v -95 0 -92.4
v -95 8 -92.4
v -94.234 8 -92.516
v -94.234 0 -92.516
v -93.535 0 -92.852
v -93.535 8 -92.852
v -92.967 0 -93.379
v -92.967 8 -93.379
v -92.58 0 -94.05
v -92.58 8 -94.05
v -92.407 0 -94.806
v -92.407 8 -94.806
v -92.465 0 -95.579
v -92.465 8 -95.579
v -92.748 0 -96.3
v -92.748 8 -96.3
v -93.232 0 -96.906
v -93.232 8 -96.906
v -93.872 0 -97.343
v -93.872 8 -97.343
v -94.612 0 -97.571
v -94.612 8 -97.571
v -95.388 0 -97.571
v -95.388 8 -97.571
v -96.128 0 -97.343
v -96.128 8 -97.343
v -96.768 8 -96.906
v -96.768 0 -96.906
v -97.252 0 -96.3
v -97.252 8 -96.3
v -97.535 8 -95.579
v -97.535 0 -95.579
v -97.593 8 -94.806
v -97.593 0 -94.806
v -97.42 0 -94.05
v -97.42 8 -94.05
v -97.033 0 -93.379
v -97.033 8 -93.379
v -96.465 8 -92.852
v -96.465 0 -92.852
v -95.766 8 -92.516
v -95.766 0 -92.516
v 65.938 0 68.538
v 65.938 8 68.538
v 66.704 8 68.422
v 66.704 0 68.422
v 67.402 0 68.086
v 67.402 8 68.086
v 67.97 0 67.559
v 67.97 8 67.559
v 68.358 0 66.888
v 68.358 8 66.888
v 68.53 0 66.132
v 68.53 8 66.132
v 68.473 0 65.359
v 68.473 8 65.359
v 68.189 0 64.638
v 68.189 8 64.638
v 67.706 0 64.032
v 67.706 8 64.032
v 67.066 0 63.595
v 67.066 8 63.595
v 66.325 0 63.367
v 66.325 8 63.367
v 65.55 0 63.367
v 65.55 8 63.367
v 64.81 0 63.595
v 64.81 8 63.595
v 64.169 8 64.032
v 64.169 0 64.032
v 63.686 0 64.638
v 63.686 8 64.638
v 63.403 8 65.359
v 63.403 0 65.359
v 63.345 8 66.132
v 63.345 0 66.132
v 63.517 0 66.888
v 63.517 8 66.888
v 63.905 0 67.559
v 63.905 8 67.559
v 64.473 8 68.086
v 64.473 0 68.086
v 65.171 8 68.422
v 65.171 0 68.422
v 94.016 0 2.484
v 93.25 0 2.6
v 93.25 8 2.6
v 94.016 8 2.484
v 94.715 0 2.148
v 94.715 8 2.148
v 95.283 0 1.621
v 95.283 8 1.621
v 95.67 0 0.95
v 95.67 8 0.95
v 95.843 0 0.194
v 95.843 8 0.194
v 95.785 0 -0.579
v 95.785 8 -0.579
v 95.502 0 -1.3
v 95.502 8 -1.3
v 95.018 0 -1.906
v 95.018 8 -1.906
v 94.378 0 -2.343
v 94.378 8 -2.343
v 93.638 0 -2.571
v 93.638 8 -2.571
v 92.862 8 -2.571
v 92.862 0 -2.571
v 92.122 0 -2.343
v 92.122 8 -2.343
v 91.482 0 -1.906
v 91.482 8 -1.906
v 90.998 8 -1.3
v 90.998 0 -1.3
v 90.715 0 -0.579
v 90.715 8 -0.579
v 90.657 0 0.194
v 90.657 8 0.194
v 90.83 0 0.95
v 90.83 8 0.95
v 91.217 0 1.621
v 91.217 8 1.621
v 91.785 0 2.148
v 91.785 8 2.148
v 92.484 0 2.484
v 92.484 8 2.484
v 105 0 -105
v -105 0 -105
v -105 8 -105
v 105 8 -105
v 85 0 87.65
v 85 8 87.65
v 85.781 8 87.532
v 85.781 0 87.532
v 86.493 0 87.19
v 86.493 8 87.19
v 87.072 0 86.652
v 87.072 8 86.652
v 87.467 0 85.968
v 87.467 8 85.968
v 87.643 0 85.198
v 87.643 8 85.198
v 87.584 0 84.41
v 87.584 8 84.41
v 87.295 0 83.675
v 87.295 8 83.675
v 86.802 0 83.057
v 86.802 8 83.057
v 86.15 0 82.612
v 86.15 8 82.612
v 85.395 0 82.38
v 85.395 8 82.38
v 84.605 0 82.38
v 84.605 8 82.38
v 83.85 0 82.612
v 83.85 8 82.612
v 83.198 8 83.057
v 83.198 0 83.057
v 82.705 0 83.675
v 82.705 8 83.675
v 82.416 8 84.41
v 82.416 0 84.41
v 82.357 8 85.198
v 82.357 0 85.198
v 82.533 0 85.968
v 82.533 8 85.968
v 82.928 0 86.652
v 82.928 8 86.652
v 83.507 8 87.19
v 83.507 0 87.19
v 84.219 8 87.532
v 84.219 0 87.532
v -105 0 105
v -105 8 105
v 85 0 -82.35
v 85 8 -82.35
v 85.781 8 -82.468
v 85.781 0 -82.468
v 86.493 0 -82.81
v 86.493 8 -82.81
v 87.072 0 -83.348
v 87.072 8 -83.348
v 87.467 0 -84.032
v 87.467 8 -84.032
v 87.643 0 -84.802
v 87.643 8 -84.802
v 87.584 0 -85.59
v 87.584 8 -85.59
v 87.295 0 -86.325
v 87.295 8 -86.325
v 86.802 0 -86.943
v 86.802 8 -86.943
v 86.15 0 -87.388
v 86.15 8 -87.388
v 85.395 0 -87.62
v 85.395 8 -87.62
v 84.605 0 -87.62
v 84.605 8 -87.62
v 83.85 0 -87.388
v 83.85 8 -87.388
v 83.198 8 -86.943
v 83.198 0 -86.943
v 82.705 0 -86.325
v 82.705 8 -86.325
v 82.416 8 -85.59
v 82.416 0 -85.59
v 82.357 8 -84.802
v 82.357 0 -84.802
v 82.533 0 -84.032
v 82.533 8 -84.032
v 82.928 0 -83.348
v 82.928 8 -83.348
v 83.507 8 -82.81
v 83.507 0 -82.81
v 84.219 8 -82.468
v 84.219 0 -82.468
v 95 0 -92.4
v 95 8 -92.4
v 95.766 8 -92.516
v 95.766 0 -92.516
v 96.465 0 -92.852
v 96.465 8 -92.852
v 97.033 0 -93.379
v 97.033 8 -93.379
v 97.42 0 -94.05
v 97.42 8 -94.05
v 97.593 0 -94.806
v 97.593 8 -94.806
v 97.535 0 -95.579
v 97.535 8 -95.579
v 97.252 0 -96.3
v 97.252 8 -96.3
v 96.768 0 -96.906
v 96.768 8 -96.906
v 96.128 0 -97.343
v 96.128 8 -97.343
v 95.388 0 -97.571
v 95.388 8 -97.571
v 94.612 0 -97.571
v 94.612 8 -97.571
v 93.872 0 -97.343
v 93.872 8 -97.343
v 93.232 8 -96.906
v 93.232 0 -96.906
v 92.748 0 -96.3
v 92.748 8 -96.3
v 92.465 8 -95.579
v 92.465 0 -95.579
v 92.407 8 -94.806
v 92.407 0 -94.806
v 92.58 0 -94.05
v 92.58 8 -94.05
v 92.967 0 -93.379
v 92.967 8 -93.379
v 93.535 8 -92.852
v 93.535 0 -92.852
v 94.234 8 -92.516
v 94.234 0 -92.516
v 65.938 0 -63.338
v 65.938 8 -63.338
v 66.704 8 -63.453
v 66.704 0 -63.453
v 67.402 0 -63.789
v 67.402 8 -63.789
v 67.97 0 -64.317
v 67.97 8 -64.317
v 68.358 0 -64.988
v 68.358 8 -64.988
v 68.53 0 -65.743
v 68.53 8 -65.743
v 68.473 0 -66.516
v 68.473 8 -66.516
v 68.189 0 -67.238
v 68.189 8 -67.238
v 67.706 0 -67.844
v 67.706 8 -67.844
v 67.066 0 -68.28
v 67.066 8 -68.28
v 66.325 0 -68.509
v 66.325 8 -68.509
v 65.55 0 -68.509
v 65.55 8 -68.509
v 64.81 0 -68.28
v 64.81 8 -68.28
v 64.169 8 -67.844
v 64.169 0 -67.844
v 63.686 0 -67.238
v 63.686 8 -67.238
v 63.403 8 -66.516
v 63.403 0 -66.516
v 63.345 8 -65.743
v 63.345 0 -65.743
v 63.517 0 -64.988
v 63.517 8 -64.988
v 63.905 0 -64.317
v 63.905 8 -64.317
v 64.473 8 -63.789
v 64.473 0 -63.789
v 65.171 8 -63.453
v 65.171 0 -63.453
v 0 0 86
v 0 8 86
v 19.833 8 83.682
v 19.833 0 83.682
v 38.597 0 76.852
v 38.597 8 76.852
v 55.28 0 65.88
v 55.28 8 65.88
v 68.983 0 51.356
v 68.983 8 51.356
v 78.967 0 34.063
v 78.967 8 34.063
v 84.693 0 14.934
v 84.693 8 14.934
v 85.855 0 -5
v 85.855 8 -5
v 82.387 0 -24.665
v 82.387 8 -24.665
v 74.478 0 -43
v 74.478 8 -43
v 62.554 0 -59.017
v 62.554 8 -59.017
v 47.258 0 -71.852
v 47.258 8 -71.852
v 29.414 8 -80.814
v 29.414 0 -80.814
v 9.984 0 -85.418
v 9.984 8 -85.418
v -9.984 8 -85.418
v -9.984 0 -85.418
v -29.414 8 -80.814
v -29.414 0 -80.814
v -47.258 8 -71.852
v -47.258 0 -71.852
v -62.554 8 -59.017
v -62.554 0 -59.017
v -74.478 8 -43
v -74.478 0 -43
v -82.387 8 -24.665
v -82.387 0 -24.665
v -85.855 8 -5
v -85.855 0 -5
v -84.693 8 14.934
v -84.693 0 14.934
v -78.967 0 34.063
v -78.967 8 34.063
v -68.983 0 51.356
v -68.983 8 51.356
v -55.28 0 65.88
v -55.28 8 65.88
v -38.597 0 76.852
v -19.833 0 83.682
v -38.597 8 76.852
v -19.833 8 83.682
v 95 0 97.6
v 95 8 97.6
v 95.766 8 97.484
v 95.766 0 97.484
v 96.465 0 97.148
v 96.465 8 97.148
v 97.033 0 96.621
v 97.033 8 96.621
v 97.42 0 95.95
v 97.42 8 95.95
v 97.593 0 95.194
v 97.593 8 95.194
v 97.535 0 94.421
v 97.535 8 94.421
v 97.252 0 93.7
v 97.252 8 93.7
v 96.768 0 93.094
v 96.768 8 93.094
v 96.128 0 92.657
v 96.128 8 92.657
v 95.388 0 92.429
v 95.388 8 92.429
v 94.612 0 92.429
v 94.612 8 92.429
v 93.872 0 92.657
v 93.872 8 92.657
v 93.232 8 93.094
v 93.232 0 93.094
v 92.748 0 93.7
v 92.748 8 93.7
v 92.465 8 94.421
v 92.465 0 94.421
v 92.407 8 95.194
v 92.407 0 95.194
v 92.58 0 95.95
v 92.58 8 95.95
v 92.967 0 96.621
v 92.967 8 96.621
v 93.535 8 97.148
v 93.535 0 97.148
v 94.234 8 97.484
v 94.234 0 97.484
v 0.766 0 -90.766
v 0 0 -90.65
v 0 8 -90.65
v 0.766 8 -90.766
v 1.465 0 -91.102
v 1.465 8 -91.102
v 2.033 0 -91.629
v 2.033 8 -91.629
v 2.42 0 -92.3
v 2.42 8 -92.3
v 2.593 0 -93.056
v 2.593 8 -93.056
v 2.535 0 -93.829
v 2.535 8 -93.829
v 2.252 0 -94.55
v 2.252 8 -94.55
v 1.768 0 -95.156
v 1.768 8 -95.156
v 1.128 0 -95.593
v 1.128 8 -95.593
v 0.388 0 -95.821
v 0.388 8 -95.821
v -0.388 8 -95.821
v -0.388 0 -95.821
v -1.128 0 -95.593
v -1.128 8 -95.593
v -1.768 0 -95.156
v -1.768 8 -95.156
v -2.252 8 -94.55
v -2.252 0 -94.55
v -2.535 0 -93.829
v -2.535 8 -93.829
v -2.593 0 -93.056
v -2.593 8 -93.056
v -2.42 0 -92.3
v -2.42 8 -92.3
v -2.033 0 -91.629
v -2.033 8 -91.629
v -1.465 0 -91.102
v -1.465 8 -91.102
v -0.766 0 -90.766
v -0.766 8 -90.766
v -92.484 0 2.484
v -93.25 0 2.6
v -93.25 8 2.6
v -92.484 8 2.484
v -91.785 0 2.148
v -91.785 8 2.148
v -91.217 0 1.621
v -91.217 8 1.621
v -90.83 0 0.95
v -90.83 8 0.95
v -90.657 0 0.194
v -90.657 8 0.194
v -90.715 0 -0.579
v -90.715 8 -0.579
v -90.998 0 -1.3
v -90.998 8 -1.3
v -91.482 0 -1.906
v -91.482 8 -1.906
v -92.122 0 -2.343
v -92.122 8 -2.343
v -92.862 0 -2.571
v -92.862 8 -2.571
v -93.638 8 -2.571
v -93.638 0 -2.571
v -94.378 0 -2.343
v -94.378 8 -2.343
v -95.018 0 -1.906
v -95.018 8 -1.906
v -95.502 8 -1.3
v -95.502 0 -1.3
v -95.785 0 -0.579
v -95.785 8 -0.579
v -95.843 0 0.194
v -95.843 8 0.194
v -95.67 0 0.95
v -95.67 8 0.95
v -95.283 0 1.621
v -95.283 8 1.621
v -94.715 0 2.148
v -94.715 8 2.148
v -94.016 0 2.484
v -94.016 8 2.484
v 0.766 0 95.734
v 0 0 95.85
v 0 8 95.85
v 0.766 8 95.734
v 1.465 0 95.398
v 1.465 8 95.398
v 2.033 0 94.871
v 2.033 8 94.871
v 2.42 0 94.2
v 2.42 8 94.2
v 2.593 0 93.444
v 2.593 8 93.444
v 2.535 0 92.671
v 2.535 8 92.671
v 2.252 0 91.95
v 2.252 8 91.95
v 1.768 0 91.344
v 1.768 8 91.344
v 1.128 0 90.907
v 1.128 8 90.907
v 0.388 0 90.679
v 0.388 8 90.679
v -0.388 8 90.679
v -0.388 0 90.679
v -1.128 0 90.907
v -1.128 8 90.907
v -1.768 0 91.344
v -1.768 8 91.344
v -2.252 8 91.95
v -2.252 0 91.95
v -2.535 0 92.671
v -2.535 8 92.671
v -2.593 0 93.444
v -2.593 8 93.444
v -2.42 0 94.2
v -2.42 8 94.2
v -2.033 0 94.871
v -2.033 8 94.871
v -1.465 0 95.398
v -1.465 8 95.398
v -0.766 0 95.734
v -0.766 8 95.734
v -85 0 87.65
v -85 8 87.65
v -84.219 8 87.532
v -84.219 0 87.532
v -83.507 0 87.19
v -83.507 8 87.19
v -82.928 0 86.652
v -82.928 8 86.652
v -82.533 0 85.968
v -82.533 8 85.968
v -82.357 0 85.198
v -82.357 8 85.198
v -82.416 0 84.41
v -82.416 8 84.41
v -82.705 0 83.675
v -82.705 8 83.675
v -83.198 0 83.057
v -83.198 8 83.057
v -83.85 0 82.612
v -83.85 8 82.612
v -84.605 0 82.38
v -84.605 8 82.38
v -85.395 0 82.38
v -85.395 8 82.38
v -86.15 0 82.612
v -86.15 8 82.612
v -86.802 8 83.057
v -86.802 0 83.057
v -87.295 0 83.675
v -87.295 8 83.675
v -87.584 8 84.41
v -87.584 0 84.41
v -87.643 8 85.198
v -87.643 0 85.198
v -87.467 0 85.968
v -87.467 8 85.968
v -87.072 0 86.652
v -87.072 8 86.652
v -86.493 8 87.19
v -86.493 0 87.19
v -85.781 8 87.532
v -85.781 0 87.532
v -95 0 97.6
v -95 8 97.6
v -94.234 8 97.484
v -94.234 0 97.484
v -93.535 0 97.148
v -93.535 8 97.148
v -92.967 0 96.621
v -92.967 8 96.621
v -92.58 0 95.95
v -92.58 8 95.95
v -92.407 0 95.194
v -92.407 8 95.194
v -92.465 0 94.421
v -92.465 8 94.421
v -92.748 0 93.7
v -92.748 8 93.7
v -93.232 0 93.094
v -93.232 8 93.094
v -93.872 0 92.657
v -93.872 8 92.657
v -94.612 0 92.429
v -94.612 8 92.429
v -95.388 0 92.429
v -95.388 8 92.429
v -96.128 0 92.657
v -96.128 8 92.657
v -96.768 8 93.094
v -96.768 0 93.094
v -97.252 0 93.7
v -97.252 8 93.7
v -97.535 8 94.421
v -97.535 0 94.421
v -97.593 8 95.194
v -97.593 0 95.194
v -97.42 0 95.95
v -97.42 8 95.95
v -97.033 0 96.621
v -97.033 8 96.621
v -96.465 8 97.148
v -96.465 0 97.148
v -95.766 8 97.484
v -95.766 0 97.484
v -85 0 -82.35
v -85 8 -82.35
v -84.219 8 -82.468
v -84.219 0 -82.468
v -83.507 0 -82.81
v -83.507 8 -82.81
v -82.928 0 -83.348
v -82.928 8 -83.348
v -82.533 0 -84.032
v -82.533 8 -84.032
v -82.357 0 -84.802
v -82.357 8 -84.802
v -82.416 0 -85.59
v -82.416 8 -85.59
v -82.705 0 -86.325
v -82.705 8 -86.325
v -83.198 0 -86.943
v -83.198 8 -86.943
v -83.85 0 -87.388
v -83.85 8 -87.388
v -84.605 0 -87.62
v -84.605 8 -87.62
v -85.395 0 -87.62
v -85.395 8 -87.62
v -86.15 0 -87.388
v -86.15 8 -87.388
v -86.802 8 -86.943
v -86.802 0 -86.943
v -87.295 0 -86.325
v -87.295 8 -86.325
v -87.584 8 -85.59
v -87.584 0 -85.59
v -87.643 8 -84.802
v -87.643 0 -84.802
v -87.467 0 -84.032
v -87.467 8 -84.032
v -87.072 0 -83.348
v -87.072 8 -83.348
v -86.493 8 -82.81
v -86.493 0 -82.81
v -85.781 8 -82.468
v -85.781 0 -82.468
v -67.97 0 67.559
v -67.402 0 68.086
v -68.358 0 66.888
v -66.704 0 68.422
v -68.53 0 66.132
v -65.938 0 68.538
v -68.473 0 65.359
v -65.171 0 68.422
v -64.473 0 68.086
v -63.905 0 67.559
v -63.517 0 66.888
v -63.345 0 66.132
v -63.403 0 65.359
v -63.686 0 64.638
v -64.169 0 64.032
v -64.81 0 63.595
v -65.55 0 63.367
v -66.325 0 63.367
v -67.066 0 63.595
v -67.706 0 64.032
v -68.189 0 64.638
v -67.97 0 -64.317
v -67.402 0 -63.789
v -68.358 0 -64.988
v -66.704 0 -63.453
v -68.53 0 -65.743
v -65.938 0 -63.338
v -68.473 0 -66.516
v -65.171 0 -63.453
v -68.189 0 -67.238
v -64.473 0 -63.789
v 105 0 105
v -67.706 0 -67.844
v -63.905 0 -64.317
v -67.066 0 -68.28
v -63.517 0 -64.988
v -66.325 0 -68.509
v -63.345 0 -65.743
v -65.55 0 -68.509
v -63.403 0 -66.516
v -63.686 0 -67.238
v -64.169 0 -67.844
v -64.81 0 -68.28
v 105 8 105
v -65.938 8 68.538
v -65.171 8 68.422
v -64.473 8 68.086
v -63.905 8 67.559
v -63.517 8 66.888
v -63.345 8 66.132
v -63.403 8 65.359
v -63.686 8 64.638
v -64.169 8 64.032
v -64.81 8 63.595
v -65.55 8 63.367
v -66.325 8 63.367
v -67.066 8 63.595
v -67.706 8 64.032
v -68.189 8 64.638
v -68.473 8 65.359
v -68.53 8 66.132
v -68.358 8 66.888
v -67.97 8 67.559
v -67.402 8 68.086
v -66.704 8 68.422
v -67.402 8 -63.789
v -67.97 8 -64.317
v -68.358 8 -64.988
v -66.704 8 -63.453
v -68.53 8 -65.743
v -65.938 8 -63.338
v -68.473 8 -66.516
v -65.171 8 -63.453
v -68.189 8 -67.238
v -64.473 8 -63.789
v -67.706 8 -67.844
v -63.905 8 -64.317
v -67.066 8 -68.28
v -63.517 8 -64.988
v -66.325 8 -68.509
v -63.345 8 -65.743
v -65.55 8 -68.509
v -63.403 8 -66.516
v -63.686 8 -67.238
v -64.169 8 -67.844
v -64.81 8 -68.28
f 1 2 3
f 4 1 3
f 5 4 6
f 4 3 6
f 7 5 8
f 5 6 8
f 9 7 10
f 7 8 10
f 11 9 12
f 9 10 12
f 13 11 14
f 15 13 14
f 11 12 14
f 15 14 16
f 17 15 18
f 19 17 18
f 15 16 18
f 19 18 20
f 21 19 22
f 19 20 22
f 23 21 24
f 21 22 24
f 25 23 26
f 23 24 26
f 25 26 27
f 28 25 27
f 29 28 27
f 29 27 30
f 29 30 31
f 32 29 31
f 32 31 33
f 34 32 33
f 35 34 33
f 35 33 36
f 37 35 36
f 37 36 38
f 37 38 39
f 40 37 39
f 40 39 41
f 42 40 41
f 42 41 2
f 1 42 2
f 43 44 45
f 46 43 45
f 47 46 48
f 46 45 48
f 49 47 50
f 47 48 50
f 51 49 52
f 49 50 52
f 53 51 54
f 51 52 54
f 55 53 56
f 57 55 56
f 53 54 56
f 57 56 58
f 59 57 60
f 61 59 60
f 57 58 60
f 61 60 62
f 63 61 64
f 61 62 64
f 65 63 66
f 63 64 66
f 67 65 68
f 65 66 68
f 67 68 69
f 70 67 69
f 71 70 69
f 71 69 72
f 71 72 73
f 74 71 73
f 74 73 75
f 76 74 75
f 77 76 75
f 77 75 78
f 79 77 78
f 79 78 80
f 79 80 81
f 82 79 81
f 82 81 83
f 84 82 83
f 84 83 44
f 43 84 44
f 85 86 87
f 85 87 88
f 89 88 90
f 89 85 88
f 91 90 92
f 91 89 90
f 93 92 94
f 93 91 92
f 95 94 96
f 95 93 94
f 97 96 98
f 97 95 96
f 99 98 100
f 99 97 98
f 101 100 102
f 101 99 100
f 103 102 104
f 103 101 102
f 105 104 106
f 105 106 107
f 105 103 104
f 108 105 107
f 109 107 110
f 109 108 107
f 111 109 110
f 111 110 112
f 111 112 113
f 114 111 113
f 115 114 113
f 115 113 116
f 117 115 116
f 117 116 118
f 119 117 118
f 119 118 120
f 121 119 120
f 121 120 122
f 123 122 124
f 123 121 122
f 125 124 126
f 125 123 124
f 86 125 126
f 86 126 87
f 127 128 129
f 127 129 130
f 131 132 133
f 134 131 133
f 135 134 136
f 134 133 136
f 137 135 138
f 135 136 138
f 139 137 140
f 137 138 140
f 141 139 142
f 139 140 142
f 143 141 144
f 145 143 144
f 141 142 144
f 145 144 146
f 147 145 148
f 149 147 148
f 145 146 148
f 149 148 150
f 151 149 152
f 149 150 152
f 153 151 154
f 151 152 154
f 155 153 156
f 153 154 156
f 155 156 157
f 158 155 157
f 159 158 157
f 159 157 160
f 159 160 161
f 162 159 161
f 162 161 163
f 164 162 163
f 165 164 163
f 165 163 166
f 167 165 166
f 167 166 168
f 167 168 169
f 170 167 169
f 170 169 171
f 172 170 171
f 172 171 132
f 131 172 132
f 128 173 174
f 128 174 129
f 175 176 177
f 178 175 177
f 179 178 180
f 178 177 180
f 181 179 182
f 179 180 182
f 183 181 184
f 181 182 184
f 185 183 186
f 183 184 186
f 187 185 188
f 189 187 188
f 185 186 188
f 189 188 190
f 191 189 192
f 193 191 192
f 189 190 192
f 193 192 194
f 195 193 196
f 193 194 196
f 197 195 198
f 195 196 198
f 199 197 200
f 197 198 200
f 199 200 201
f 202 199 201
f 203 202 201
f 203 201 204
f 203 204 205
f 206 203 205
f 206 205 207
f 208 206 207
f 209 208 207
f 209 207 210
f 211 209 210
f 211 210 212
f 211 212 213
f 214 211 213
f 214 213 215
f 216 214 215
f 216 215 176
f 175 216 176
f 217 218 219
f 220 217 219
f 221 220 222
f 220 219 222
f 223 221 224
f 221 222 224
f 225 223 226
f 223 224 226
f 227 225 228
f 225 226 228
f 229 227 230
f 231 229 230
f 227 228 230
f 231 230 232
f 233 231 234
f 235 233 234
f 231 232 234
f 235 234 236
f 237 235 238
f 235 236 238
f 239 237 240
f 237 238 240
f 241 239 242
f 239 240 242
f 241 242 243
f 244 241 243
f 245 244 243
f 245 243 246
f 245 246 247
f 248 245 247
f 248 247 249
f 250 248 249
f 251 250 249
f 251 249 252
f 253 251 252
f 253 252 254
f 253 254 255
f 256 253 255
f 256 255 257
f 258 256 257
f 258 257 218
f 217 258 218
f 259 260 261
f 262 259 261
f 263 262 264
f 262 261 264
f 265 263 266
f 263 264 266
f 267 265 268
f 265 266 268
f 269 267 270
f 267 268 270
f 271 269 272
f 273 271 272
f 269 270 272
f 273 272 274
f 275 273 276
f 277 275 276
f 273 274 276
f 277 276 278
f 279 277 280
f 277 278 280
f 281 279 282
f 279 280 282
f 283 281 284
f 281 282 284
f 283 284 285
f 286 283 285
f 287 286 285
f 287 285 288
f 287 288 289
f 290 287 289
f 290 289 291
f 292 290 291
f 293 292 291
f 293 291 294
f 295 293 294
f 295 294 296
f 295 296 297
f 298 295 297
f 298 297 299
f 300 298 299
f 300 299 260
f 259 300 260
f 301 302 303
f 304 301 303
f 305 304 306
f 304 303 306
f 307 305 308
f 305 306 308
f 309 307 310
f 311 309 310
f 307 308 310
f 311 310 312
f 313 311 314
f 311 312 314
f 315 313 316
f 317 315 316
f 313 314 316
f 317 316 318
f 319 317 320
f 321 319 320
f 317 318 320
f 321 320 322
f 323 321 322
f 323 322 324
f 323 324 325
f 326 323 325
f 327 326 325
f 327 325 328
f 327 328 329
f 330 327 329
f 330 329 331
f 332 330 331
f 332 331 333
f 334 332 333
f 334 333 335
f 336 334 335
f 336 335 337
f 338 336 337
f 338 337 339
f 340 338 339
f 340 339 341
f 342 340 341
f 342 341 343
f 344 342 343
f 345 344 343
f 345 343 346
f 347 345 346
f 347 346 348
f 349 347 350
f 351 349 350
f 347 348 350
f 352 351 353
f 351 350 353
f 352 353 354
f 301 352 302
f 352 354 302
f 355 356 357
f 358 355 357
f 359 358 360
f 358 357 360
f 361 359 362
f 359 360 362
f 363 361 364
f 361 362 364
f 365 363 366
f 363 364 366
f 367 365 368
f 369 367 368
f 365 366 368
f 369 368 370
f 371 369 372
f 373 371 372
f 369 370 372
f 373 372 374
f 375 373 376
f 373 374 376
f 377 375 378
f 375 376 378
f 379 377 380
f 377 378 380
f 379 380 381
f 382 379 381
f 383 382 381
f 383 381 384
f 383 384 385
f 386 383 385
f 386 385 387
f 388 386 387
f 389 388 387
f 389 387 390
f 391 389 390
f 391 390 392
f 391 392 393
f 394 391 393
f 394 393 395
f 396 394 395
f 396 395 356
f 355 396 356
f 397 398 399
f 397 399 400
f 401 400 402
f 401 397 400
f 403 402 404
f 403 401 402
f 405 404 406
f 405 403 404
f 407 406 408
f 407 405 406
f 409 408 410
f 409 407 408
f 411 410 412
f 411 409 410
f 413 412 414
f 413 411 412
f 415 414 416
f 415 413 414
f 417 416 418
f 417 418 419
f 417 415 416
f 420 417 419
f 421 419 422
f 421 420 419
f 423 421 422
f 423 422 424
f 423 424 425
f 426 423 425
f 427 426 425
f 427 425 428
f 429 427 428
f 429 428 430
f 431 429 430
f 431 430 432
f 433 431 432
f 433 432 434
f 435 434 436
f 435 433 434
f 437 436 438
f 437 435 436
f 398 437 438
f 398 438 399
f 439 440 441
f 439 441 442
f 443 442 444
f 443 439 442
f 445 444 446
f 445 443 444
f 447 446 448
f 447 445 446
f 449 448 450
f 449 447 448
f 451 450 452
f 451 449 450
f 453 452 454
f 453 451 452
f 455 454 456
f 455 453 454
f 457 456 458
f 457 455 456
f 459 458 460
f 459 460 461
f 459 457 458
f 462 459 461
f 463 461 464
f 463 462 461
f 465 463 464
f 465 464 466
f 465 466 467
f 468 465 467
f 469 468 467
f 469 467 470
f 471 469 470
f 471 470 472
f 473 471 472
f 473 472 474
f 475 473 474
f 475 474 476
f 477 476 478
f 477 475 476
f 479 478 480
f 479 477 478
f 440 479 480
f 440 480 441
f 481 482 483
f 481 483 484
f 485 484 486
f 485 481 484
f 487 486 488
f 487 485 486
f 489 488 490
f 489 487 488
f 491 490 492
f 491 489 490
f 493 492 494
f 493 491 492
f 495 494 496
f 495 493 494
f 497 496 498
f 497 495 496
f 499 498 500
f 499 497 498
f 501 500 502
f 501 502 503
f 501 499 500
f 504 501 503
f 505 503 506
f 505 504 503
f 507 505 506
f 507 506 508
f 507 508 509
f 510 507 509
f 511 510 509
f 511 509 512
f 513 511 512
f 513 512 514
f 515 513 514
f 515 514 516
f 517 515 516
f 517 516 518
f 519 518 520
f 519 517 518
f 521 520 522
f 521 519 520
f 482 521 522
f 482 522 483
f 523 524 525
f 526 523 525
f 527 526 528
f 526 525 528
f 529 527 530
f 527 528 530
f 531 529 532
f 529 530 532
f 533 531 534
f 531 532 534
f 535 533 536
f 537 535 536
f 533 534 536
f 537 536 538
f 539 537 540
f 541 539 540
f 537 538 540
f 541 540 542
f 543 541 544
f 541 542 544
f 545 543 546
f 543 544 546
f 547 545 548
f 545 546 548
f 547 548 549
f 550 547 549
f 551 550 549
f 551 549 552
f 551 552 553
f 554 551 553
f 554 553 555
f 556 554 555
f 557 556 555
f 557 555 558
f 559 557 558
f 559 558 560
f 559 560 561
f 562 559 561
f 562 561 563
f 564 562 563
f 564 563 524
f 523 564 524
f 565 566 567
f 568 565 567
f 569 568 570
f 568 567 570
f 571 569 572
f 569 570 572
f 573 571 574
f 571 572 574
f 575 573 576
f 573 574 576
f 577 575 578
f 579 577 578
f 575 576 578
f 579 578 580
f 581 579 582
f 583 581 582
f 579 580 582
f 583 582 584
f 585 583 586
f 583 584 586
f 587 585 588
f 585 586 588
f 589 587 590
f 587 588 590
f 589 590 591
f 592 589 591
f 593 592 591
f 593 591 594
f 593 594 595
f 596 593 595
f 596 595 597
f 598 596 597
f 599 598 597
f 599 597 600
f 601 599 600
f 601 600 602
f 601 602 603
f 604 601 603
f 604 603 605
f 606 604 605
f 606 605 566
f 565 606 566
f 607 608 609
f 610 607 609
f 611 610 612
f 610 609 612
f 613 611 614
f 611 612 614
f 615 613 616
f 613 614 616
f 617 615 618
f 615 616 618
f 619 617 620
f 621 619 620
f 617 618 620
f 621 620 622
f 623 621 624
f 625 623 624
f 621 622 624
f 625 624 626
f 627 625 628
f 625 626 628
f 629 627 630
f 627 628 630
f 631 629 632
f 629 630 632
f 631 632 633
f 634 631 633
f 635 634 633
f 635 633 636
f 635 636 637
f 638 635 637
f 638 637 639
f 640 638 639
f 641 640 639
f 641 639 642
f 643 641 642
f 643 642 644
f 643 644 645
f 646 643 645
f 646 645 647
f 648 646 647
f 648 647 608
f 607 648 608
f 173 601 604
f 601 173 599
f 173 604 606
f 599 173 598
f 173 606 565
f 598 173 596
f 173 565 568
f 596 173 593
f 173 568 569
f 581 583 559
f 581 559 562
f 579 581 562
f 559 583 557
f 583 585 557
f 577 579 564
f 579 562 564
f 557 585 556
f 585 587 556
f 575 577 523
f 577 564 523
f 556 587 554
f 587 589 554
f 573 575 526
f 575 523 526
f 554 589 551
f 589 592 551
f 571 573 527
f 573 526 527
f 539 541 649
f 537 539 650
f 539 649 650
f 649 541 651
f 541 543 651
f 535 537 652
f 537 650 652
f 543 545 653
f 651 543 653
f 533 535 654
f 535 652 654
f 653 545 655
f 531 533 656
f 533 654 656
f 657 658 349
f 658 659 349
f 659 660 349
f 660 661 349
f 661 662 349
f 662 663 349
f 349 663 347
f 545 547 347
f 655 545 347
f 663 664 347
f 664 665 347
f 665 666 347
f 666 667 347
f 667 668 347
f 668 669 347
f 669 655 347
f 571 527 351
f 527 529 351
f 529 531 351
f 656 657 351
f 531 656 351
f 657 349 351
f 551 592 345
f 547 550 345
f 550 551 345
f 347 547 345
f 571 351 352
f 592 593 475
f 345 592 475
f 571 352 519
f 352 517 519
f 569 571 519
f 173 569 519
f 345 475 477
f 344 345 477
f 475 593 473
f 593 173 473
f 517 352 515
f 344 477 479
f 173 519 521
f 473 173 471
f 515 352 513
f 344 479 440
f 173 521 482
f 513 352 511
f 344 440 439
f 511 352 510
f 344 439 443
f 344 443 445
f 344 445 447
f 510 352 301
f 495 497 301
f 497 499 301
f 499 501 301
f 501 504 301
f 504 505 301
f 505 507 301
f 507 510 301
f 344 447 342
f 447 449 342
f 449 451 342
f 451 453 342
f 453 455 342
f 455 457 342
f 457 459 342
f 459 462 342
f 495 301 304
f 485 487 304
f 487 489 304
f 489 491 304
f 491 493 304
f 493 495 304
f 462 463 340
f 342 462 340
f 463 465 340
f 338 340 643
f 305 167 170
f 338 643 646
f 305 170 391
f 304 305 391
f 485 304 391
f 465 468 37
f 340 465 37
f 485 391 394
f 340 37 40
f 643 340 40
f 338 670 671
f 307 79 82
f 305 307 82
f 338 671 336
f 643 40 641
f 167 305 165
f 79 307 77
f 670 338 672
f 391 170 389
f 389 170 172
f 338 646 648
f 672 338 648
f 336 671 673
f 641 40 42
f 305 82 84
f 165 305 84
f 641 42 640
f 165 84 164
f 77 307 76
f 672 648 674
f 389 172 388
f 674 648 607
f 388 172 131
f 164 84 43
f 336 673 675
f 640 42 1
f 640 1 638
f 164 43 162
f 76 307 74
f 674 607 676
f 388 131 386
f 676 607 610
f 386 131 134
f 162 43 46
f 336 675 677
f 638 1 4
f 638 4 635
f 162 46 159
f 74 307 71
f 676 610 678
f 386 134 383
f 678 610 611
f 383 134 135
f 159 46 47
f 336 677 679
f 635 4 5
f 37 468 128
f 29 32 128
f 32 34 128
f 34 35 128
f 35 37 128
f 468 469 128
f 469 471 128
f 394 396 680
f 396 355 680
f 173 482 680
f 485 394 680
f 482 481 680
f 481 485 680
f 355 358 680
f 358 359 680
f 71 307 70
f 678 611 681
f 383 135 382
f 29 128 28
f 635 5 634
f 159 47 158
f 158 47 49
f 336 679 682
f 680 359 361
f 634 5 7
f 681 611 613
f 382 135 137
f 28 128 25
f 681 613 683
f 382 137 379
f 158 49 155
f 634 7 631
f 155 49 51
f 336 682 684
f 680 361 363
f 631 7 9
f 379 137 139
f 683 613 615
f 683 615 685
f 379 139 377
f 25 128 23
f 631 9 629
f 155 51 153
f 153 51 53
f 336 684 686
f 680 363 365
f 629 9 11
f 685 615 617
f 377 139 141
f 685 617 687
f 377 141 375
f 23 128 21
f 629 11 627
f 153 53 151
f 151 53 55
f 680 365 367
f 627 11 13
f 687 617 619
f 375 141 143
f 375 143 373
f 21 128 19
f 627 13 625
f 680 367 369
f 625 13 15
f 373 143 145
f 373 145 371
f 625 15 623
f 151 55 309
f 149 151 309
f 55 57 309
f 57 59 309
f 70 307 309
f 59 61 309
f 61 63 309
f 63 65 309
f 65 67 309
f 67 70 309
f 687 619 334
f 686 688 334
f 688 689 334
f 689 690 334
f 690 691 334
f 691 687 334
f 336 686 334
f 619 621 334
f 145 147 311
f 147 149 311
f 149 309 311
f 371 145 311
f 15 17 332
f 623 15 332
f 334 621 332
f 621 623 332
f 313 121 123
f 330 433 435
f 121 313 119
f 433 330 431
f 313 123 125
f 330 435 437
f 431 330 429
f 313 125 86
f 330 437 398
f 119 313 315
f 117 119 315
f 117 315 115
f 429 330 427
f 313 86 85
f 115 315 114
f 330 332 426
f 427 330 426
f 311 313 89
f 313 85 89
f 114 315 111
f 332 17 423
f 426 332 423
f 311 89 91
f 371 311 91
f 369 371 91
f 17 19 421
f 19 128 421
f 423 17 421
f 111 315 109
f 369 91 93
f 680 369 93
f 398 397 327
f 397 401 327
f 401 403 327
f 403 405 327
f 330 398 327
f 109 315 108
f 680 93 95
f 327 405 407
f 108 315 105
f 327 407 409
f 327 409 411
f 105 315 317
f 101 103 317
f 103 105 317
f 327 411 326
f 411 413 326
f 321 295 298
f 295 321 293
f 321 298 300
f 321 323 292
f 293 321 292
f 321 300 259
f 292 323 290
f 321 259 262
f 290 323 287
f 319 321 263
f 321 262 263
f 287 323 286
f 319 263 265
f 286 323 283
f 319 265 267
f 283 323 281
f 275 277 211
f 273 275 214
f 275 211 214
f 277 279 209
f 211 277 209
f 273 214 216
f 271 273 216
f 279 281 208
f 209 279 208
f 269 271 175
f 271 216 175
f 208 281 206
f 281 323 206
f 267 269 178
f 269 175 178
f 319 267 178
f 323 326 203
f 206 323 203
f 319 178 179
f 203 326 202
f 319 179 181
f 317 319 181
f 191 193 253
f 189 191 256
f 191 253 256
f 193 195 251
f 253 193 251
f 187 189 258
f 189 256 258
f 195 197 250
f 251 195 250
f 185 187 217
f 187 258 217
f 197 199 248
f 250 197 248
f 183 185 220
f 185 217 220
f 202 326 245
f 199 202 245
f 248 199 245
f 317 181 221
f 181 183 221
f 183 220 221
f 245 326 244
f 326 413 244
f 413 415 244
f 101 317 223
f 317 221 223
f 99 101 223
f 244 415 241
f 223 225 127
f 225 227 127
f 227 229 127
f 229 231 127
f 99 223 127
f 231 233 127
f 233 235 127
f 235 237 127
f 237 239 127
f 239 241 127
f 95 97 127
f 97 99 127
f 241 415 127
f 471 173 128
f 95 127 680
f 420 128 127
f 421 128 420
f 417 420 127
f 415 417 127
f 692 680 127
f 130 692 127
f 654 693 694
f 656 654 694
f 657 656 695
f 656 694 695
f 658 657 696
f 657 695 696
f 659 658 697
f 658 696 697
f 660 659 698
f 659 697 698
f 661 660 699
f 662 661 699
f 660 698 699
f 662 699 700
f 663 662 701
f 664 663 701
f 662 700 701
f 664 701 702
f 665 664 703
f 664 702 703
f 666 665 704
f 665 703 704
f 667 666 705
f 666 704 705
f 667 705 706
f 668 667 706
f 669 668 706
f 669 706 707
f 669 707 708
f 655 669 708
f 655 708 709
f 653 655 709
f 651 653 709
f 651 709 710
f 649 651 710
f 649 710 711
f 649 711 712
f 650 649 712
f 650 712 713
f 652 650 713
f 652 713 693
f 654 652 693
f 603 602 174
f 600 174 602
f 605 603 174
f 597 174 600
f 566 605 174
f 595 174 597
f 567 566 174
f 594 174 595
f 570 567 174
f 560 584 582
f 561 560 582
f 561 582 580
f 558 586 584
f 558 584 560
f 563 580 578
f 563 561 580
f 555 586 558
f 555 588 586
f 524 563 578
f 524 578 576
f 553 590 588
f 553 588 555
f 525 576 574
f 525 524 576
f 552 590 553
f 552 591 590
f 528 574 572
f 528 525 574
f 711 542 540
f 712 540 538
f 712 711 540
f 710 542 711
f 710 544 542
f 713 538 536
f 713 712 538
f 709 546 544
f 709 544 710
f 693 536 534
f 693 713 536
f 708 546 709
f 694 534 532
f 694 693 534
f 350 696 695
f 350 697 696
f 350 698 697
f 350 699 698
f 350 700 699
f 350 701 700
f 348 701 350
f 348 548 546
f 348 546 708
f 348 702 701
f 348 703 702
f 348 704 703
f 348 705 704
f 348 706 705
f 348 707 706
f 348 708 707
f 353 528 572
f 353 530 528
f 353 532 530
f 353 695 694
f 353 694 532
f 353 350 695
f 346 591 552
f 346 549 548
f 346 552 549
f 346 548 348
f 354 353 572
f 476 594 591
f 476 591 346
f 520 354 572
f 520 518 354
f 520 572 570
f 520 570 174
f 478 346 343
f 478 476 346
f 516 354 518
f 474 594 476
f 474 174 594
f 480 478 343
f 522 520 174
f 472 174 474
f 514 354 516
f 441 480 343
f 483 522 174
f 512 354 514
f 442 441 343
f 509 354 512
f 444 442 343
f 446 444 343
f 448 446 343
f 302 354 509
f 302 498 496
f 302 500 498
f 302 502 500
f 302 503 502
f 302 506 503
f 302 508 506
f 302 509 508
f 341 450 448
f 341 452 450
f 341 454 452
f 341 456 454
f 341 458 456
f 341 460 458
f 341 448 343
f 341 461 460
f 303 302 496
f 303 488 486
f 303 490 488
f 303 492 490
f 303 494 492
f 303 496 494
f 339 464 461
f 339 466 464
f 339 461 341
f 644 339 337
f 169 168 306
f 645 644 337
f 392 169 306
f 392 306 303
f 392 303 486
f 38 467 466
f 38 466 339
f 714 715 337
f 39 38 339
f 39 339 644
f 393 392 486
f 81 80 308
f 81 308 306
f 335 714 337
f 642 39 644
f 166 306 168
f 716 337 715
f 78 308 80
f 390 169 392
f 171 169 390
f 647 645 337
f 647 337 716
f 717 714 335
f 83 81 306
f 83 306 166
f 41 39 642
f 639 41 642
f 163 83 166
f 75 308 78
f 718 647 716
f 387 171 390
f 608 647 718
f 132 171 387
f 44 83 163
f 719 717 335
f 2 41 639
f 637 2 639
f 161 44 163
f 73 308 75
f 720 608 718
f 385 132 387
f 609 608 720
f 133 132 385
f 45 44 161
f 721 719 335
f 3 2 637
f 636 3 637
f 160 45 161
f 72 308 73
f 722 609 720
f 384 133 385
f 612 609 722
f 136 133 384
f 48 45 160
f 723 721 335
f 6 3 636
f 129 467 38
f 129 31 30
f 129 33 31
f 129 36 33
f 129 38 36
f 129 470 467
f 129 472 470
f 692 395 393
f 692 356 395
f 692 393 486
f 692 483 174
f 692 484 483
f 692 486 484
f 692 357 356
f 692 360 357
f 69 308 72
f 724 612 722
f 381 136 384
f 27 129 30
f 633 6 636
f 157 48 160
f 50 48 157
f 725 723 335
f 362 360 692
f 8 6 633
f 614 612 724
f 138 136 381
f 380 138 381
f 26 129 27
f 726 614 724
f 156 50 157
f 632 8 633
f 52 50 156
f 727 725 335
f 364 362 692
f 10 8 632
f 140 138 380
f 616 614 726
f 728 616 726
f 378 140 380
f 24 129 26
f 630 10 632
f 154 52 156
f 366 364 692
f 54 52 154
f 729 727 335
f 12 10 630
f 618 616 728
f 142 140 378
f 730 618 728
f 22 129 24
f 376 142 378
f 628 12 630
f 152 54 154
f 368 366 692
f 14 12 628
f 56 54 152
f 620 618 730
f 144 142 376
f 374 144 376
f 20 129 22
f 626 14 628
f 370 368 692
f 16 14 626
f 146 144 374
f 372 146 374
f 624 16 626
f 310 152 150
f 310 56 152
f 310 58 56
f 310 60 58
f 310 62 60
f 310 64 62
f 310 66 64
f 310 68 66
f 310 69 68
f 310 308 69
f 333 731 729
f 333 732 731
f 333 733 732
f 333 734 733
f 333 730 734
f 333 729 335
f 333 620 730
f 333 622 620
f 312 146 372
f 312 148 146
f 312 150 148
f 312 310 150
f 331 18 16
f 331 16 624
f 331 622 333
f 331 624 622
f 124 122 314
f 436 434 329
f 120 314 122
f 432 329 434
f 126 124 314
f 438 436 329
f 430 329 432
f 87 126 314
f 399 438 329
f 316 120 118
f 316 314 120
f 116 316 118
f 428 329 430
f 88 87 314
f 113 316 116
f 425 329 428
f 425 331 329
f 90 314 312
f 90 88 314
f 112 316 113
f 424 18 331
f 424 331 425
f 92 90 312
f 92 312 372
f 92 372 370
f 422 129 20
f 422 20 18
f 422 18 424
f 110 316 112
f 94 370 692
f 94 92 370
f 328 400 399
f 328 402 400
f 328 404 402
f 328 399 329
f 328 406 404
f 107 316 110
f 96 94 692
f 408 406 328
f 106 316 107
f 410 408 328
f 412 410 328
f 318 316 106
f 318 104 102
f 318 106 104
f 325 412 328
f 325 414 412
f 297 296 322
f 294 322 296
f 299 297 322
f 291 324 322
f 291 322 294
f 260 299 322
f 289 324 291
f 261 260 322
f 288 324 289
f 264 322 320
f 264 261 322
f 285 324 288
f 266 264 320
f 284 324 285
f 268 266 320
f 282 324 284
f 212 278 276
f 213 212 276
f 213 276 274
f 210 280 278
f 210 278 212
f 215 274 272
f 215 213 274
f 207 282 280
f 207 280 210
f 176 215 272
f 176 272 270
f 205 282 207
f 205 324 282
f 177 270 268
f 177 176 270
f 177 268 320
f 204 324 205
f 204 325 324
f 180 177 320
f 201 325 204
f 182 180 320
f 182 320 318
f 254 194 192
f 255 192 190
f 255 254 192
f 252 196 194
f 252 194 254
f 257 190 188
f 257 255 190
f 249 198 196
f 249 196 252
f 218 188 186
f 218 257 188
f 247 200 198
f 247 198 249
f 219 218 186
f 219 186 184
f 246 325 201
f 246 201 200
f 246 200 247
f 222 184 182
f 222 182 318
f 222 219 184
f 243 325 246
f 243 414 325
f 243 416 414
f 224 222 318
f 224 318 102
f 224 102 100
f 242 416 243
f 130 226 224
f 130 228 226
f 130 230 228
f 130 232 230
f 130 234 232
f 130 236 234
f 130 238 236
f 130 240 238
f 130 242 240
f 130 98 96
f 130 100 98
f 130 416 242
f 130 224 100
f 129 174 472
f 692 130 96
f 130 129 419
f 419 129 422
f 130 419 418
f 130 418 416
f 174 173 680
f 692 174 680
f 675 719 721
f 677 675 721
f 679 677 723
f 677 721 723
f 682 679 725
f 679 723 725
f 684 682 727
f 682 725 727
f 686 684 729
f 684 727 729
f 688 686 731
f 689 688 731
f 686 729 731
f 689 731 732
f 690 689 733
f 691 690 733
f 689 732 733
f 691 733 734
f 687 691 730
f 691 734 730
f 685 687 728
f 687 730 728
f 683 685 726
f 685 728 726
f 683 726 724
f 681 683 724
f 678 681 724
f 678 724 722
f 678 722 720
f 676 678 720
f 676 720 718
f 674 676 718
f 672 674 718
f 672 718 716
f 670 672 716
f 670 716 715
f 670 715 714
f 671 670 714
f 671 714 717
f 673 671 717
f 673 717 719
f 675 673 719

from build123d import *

# Parameters (mm, degrees)
SKETCH_1_W          = 210
SKETCH_1_H          = 210
SKETCH_1_R          = 85.5
SKETCH_1_R_2        = 2.6
EXTRUDE_1_DEPTH     = 8
SKETCH_2_R          = 2.6
CUT_EXTRUDE_1_DEPTH = 10
SKETCH_3_R          = 86
CUT_EXTRUDE_2_DEPTH = 10
SKETCH_4_R          = 2.65
CUT_EXTRUDE_3_DEPTH = 149.707767114


with BuildPart() as part:
    # 草图1 → 凸台-拉伸1 (new body)
    with BuildSketch(Plane(origin=(0, 0, 0), x_dir=(1, 0, 0), z_dir=(0, 1, 0))):
        Rectangle(SKETCH_1_W, SKETCH_1_H)
        with Locations(Location((0, 0, 0), (0, 0, 270))):
            Circle(SKETCH_1_R, mode=Mode.SUBTRACT)
        with Locations(Location((0, 93.25, 0), (0, 0, 270))):
            Circle(SKETCH_1_R_2, mode=Mode.SUBTRACT)
        with Locations(Location((93.25, 0, 0), (0, 0, 270))):
            Circle(SKETCH_1_R_2, mode=Mode.SUBTRACT)
        with Locations(Location((0, -93.25, 0), (0, 0, 270))):
            Circle(SKETCH_1_R_2, mode=Mode.SUBTRACT)
        with Locations(Location((-93.25, 0, 0), (0, 0, 270))):
            Circle(SKETCH_1_R_2, mode=Mode.SUBTRACT)
    extrude(amount=EXTRUDE_1_DEPTH)

    # 草图2 → 切除-拉伸1 (cut)
    with BuildSketch(Plane(origin=(0, 8, 0), x_dir=(1, 0, 0), z_dir=(0, 1, 0))):
        with Locations(Location((65.937707346, -65.937707346, 0), (0, 0, 270))):
            Circle(SKETCH_2_R)
        with Locations(Location((95, 95, 0), (0, 0, 270))):
            Circle(SKETCH_2_R)
        with Locations(Location((-65.937707346, 65.937707346, 0), (0, 0, 270))):
            Circle(SKETCH_2_R)
        with Locations(Location((65.937707346, 65.937707346, 0), (0, 0, 270))):
            Circle(SKETCH_2_R)
        with Locations(Location((-65.937707346, -65.937707346, 0), (0, 0, 270))):
            Circle(SKETCH_2_R)
        with Locations(Location((95, -95, 0), (0, 0, 270))):
            Circle(SKETCH_2_R)
        with Locations(Location((-95, -95, 0), (0, 0, 270))):
            Circle(SKETCH_2_R)
        with Locations(Location((-95, 95, 0), (0, 0, 270))):
            Circle(SKETCH_2_R)
    extrude(amount=-CUT_EXTRUDE_1_DEPTH, mode=Mode.SUBTRACT)

    # 草图3 → 切除-拉伸2 (cut)
    with BuildSketch(Plane(origin=(0, 8, 0), x_dir=(1, 0, 0), z_dir=(0, 1, 0))):
        with Locations(Location((0, 0, 0), (0, 0, 270))):
            Circle(SKETCH_3_R)
    extrude(amount=-CUT_EXTRUDE_2_DEPTH, mode=Mode.SUBTRACT)

    # 草图4 → 切除-拉伸3 (cut, through all)
    with BuildSketch(Plane(origin=(0, 8, 0), x_dir=(1, 0, 0), z_dir=(0, 1, 0))):
        with Locations(Location((85, 85, 0), (0, 0, 270))):
            Circle(SKETCH_4_R)
        with Locations(Location((-85, -85, 0), (0, 0, 270))):
            Circle(SKETCH_4_R)
        with Locations(Location((-85, 85, 0), (0, 0, 270))):
            Circle(SKETCH_4_R)
        with Locations(Location((85, -85, 0), (0, 0, 270))):
            Circle(SKETCH_4_R)
    extrude(amount=-CUT_EXTRUDE_3_DEPTH, mode=Mode.SUBTRACT)


solid = part.part
